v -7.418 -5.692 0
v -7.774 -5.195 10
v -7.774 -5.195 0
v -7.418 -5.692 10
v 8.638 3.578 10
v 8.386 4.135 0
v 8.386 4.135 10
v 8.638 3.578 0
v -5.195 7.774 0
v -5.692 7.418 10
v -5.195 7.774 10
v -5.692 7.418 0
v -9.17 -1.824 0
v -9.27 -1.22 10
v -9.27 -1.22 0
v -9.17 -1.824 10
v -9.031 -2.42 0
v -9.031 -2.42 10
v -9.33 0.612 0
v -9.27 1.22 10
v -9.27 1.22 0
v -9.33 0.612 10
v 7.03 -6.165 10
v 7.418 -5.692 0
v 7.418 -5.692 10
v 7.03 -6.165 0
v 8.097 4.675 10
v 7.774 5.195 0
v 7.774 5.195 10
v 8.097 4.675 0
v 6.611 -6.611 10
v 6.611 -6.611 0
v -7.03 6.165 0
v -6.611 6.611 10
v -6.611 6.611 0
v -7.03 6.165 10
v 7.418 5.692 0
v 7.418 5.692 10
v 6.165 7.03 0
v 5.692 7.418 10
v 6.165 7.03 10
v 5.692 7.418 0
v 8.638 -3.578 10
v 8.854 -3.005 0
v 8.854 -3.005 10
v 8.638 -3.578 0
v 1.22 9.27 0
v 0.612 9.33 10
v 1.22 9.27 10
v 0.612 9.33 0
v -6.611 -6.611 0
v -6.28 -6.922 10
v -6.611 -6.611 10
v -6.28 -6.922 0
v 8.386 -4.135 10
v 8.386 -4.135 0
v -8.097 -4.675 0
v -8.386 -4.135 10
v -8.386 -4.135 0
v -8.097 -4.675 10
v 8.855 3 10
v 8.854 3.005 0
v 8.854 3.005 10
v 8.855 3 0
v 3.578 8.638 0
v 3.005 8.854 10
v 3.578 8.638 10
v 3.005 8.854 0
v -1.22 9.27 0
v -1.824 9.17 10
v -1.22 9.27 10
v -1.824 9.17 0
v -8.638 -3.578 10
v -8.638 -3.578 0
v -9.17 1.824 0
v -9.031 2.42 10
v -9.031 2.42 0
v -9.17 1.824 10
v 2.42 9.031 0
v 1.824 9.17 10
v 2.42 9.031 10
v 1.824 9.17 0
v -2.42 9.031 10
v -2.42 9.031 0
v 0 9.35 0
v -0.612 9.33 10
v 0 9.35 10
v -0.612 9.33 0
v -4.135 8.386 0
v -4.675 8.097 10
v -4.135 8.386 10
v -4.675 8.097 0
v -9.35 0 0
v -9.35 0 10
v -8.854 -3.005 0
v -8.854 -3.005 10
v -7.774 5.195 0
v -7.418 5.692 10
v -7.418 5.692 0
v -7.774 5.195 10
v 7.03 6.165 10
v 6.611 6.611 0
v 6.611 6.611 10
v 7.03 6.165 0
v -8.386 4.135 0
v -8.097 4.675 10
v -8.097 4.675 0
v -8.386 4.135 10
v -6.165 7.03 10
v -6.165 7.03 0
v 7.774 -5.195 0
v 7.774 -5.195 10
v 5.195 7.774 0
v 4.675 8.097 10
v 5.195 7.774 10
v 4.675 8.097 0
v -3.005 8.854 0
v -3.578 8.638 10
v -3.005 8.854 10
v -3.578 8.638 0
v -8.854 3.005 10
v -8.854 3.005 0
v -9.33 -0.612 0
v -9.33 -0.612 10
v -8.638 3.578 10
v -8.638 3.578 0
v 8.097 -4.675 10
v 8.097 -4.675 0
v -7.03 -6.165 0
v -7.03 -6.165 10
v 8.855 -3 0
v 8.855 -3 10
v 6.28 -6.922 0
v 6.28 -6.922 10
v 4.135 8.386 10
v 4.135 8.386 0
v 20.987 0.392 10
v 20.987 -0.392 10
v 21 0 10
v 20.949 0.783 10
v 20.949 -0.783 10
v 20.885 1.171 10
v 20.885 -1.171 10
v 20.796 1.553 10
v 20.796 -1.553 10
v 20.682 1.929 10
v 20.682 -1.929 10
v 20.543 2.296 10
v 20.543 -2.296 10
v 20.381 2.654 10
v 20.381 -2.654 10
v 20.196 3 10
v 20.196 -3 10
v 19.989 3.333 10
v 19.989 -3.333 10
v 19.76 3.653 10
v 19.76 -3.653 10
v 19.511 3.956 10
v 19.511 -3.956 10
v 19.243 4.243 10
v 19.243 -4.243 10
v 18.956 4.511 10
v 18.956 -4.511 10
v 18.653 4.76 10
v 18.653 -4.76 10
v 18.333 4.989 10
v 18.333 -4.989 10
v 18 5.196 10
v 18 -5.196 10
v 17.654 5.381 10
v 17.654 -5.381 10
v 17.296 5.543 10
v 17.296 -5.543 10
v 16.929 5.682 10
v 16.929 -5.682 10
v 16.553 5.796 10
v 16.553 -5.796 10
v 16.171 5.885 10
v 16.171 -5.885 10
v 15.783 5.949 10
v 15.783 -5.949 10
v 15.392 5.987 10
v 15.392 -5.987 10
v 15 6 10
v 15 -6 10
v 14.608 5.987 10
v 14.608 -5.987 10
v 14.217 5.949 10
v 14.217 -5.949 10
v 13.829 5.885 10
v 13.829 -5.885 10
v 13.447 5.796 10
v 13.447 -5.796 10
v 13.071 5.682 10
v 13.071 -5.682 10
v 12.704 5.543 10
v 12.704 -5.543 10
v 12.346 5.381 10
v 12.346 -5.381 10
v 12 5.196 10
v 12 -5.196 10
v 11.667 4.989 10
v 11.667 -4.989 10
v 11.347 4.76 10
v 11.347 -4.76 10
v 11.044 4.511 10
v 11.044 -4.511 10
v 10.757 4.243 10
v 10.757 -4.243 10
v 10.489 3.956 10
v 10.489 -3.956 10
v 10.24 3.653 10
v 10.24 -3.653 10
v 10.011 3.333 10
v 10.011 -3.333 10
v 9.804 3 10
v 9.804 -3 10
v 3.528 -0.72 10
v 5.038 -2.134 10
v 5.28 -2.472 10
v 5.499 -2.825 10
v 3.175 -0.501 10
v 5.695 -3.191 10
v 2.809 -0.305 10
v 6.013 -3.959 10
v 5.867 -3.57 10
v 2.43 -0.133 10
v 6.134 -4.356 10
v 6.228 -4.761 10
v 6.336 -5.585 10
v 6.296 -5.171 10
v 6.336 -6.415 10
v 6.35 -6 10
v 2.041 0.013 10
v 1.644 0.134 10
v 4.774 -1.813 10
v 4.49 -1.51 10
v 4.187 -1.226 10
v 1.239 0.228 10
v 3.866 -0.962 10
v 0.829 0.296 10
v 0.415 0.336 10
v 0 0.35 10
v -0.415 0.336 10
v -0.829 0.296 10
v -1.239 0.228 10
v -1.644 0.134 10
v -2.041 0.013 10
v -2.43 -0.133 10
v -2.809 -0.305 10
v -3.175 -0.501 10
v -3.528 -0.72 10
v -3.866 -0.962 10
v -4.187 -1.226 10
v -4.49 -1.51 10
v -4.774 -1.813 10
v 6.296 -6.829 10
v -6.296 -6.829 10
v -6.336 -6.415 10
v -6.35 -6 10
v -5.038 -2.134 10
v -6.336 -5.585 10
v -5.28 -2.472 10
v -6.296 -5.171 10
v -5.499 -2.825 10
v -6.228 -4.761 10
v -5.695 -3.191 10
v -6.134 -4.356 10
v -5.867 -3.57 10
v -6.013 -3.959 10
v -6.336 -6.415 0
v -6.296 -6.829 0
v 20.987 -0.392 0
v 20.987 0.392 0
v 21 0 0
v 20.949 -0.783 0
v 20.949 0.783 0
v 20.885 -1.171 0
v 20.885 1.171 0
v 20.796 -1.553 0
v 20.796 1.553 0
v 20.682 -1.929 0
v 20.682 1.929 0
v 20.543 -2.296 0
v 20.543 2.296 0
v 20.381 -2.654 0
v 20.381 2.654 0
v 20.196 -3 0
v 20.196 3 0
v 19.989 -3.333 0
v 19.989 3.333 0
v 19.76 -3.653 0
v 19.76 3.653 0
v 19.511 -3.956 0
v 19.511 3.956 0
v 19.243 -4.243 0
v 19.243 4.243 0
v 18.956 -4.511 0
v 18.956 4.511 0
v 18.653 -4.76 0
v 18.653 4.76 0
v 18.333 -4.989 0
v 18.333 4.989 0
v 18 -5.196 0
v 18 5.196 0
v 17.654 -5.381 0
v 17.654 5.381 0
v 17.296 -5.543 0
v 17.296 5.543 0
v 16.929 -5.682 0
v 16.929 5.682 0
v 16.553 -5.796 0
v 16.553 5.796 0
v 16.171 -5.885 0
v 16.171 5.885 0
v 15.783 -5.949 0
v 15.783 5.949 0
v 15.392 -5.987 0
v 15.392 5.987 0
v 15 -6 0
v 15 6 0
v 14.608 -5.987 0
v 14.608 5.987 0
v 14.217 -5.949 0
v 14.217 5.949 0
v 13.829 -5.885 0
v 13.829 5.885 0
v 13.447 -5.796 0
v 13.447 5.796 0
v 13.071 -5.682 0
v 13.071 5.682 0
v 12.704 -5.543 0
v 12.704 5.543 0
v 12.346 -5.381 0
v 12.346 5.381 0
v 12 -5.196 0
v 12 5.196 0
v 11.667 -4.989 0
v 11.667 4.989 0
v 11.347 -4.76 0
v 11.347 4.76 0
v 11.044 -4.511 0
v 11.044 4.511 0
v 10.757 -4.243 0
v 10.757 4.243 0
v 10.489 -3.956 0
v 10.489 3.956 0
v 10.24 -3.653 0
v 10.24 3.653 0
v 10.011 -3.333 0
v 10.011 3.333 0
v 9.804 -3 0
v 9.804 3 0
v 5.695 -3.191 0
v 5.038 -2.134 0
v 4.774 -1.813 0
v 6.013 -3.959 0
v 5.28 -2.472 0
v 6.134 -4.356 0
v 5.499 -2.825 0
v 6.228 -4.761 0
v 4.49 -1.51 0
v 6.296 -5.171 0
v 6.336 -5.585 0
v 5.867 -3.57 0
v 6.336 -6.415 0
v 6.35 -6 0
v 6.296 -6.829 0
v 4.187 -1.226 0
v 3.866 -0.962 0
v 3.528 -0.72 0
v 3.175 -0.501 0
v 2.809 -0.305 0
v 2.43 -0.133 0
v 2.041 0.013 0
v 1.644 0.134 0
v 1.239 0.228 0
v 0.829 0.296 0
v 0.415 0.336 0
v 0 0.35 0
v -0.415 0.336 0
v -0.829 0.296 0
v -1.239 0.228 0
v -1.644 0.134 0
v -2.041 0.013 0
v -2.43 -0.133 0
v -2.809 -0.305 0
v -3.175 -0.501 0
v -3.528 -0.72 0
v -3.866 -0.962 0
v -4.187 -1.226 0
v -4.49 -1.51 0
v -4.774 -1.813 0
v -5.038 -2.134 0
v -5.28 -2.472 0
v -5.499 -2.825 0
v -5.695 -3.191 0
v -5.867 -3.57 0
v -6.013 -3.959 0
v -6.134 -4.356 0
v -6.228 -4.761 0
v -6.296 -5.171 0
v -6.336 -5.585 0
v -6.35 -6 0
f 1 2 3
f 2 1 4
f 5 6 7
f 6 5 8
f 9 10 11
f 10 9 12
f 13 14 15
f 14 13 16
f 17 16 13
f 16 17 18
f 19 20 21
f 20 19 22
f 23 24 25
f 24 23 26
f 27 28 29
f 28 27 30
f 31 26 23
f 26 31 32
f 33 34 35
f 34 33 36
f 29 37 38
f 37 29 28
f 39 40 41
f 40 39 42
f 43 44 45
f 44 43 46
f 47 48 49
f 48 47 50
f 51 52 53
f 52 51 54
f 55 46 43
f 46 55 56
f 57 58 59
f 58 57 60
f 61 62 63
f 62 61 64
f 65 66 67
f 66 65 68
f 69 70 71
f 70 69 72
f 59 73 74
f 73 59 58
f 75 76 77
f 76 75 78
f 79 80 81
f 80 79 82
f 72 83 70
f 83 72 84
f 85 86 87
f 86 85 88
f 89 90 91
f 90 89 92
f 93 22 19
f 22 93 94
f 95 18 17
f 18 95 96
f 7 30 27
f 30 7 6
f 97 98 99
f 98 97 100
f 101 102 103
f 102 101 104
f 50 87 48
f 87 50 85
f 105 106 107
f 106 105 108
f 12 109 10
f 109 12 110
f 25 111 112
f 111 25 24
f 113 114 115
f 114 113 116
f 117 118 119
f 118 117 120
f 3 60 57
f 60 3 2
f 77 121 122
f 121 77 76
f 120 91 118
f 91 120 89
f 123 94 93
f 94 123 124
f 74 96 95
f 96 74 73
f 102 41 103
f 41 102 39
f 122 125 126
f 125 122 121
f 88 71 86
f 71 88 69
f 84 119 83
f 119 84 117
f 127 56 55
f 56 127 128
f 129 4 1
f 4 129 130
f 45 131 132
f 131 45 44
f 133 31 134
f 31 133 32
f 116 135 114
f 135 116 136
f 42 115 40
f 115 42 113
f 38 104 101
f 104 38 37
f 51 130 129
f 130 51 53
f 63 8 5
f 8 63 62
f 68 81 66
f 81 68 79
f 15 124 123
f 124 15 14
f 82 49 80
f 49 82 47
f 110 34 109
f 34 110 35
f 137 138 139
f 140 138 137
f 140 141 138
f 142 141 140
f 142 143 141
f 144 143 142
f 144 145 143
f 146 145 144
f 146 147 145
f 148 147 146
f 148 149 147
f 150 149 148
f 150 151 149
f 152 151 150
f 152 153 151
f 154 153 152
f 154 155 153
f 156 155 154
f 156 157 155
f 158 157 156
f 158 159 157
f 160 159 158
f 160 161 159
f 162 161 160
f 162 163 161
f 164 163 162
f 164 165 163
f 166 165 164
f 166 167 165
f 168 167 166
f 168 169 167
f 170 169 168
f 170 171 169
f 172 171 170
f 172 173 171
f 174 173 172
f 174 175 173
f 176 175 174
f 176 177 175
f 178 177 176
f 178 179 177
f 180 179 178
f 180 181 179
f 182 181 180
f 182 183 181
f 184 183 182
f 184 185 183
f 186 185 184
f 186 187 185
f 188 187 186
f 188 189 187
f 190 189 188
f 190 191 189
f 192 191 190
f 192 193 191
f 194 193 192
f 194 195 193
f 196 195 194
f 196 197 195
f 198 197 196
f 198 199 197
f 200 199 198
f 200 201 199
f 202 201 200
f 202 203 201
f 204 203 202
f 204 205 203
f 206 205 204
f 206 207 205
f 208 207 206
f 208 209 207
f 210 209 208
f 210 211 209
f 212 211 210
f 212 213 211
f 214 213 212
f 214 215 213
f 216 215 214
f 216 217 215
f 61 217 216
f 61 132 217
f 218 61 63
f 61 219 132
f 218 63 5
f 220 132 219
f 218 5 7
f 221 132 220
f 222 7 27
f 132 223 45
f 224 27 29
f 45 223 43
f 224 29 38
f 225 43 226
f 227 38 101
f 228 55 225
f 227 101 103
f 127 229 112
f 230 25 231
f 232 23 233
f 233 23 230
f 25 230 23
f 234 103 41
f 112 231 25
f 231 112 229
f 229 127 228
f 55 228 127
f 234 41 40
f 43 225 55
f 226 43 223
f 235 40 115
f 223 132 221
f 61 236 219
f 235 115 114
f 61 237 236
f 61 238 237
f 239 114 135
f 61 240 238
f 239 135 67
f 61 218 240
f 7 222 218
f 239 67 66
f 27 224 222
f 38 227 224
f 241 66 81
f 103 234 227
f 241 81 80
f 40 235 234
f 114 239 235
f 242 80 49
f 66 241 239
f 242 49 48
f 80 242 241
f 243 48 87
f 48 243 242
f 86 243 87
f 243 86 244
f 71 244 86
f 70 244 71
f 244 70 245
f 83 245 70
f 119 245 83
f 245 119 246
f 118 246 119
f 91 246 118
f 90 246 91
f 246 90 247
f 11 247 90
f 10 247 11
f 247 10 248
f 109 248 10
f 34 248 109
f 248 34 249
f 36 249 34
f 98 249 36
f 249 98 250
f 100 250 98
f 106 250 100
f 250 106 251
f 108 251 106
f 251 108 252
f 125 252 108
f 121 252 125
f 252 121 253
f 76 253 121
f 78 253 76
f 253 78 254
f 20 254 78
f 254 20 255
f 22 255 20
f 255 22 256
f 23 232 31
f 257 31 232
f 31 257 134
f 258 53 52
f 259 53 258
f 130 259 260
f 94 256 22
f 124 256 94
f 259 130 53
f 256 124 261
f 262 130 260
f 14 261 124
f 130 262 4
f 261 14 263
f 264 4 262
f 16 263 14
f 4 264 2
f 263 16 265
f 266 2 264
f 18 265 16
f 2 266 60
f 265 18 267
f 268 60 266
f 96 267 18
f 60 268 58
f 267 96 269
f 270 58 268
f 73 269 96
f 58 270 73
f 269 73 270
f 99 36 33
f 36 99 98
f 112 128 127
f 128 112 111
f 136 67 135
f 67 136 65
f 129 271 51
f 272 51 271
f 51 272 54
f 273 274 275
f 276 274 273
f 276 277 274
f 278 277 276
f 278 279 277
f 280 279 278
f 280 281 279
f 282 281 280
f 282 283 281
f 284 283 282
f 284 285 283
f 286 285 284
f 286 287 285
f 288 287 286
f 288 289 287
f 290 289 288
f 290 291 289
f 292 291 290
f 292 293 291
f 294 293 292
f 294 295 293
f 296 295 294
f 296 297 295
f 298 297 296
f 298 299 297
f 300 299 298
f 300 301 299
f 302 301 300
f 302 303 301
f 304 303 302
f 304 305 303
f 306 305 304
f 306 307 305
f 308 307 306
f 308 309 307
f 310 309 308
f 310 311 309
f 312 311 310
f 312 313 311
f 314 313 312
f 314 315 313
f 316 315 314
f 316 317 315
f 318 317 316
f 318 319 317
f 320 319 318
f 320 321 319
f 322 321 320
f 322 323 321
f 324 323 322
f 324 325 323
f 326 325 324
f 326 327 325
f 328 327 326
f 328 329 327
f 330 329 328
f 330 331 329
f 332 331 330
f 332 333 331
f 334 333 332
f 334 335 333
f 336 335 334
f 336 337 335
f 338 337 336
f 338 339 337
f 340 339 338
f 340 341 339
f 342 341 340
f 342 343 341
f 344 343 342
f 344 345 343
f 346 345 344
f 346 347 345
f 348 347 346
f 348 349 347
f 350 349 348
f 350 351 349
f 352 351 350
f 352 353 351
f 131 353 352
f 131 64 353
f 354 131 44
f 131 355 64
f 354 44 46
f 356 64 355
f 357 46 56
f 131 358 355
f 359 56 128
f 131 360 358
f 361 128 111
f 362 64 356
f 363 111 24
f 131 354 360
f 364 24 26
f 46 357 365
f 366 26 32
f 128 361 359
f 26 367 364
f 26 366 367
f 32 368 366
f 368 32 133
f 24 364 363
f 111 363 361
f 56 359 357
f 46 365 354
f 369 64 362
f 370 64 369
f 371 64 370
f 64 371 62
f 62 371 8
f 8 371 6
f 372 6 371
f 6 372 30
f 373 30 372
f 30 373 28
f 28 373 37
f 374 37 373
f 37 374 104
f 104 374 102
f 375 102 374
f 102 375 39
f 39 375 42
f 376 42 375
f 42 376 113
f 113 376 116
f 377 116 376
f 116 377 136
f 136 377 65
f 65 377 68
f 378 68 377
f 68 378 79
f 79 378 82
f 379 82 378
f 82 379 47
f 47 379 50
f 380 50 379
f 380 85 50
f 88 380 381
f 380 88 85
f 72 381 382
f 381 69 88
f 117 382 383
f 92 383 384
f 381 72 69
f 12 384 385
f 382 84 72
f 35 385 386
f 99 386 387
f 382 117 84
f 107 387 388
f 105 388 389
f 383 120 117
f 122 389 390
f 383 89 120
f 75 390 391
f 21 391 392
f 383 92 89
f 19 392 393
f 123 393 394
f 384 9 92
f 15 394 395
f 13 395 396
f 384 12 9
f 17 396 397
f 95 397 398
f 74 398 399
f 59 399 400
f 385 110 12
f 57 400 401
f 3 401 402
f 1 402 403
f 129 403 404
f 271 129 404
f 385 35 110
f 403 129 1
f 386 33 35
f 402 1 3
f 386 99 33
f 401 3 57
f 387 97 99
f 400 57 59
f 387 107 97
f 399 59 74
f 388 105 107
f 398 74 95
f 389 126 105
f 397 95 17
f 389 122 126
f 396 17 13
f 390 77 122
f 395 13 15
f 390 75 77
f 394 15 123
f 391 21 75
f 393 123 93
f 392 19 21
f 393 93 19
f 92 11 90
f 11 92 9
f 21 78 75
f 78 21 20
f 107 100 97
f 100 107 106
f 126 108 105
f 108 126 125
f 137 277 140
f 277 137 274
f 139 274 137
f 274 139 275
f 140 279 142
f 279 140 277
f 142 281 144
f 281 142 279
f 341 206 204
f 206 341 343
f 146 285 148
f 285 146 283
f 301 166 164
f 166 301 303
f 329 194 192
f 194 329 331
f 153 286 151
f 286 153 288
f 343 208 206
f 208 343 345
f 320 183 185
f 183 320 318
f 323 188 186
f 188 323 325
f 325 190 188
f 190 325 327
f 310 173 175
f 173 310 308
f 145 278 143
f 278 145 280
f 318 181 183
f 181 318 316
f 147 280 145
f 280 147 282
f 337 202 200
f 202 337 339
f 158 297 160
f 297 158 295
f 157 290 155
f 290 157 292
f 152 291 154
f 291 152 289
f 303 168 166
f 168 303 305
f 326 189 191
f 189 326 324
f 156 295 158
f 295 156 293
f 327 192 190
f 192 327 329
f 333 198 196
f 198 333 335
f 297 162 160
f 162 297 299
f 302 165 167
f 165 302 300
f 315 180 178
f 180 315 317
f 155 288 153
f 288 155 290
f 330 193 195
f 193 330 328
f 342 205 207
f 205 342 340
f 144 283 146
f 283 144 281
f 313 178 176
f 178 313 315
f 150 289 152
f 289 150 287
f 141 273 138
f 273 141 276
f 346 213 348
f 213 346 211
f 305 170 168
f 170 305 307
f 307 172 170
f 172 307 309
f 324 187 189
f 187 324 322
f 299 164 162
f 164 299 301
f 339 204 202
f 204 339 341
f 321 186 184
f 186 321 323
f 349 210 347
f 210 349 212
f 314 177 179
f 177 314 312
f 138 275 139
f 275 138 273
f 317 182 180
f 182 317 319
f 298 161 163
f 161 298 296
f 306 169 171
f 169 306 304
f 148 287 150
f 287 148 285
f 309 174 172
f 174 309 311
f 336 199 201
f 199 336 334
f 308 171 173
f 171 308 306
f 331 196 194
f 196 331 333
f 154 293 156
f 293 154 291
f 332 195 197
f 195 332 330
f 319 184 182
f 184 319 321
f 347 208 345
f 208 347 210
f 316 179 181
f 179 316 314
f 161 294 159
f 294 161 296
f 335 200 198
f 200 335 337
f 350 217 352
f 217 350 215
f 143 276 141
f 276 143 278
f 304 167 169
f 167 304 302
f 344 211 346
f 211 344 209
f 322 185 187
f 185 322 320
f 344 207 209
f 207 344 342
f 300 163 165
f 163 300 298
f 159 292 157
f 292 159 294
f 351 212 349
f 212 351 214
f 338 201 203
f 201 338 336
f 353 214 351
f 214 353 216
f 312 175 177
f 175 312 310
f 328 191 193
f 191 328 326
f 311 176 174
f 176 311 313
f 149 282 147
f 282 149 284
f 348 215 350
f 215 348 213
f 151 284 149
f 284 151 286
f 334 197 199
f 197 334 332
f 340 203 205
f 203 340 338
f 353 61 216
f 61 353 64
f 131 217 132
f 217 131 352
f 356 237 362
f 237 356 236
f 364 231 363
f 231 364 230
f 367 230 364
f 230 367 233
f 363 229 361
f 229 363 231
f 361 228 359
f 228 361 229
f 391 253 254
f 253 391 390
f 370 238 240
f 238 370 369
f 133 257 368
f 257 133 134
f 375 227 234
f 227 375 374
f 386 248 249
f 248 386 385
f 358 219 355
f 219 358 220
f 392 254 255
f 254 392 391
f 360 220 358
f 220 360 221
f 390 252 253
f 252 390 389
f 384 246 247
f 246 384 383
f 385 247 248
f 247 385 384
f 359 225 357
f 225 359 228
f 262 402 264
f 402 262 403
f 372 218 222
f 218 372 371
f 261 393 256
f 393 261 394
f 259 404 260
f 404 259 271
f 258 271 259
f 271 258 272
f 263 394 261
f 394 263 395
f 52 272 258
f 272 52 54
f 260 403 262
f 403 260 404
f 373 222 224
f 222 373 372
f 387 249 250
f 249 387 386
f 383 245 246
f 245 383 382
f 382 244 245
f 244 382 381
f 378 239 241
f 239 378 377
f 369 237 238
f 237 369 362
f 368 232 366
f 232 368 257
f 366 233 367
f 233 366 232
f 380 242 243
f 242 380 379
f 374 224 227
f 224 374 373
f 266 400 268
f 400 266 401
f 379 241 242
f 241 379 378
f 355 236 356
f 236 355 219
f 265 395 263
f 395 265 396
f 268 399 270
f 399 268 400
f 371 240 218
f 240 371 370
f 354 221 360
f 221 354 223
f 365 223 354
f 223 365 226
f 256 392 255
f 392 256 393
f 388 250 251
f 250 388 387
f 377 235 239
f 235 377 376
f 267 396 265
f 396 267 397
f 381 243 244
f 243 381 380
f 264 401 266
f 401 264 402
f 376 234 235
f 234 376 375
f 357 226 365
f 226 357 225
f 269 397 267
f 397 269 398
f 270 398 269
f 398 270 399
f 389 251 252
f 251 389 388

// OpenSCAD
// Stand rod tube clip - an open ring that snaps onto a round stand rod (e.g. 12.7 mm / 1/2 inch)
// with a separate ring for a small tube, joined by a bridge. NOVEL part.
//

rod_d  = 12.7;
wall_r = 3;
tube_d = 6;
t     = 2;
bridge_w = 6;
height = 10;

$fn = 96;

inner_r = rod_d / 2;
outer_r = inner_r + wall_r;
tube_r  = tube_d / 2;

difference() {
    union() {
        cylinder(h = height, r = outer_r);                 // rod ring
        translate([15, 0, 0]) cylinder(h = height, r = tube_r + wall_r);   // tubing ring
        translate([7, -3, 0]) cube([bridge_w, 6, height]);                      // bridge
    }
    translate([0, -6, -1]) cylinder(h = height + 2, r = inner_r);                     // rod hole
    translate([15, 0, 0]) translate([15, -2.25, -1]) cube([1, 4.5, height + 2]);     // tube opening
}
